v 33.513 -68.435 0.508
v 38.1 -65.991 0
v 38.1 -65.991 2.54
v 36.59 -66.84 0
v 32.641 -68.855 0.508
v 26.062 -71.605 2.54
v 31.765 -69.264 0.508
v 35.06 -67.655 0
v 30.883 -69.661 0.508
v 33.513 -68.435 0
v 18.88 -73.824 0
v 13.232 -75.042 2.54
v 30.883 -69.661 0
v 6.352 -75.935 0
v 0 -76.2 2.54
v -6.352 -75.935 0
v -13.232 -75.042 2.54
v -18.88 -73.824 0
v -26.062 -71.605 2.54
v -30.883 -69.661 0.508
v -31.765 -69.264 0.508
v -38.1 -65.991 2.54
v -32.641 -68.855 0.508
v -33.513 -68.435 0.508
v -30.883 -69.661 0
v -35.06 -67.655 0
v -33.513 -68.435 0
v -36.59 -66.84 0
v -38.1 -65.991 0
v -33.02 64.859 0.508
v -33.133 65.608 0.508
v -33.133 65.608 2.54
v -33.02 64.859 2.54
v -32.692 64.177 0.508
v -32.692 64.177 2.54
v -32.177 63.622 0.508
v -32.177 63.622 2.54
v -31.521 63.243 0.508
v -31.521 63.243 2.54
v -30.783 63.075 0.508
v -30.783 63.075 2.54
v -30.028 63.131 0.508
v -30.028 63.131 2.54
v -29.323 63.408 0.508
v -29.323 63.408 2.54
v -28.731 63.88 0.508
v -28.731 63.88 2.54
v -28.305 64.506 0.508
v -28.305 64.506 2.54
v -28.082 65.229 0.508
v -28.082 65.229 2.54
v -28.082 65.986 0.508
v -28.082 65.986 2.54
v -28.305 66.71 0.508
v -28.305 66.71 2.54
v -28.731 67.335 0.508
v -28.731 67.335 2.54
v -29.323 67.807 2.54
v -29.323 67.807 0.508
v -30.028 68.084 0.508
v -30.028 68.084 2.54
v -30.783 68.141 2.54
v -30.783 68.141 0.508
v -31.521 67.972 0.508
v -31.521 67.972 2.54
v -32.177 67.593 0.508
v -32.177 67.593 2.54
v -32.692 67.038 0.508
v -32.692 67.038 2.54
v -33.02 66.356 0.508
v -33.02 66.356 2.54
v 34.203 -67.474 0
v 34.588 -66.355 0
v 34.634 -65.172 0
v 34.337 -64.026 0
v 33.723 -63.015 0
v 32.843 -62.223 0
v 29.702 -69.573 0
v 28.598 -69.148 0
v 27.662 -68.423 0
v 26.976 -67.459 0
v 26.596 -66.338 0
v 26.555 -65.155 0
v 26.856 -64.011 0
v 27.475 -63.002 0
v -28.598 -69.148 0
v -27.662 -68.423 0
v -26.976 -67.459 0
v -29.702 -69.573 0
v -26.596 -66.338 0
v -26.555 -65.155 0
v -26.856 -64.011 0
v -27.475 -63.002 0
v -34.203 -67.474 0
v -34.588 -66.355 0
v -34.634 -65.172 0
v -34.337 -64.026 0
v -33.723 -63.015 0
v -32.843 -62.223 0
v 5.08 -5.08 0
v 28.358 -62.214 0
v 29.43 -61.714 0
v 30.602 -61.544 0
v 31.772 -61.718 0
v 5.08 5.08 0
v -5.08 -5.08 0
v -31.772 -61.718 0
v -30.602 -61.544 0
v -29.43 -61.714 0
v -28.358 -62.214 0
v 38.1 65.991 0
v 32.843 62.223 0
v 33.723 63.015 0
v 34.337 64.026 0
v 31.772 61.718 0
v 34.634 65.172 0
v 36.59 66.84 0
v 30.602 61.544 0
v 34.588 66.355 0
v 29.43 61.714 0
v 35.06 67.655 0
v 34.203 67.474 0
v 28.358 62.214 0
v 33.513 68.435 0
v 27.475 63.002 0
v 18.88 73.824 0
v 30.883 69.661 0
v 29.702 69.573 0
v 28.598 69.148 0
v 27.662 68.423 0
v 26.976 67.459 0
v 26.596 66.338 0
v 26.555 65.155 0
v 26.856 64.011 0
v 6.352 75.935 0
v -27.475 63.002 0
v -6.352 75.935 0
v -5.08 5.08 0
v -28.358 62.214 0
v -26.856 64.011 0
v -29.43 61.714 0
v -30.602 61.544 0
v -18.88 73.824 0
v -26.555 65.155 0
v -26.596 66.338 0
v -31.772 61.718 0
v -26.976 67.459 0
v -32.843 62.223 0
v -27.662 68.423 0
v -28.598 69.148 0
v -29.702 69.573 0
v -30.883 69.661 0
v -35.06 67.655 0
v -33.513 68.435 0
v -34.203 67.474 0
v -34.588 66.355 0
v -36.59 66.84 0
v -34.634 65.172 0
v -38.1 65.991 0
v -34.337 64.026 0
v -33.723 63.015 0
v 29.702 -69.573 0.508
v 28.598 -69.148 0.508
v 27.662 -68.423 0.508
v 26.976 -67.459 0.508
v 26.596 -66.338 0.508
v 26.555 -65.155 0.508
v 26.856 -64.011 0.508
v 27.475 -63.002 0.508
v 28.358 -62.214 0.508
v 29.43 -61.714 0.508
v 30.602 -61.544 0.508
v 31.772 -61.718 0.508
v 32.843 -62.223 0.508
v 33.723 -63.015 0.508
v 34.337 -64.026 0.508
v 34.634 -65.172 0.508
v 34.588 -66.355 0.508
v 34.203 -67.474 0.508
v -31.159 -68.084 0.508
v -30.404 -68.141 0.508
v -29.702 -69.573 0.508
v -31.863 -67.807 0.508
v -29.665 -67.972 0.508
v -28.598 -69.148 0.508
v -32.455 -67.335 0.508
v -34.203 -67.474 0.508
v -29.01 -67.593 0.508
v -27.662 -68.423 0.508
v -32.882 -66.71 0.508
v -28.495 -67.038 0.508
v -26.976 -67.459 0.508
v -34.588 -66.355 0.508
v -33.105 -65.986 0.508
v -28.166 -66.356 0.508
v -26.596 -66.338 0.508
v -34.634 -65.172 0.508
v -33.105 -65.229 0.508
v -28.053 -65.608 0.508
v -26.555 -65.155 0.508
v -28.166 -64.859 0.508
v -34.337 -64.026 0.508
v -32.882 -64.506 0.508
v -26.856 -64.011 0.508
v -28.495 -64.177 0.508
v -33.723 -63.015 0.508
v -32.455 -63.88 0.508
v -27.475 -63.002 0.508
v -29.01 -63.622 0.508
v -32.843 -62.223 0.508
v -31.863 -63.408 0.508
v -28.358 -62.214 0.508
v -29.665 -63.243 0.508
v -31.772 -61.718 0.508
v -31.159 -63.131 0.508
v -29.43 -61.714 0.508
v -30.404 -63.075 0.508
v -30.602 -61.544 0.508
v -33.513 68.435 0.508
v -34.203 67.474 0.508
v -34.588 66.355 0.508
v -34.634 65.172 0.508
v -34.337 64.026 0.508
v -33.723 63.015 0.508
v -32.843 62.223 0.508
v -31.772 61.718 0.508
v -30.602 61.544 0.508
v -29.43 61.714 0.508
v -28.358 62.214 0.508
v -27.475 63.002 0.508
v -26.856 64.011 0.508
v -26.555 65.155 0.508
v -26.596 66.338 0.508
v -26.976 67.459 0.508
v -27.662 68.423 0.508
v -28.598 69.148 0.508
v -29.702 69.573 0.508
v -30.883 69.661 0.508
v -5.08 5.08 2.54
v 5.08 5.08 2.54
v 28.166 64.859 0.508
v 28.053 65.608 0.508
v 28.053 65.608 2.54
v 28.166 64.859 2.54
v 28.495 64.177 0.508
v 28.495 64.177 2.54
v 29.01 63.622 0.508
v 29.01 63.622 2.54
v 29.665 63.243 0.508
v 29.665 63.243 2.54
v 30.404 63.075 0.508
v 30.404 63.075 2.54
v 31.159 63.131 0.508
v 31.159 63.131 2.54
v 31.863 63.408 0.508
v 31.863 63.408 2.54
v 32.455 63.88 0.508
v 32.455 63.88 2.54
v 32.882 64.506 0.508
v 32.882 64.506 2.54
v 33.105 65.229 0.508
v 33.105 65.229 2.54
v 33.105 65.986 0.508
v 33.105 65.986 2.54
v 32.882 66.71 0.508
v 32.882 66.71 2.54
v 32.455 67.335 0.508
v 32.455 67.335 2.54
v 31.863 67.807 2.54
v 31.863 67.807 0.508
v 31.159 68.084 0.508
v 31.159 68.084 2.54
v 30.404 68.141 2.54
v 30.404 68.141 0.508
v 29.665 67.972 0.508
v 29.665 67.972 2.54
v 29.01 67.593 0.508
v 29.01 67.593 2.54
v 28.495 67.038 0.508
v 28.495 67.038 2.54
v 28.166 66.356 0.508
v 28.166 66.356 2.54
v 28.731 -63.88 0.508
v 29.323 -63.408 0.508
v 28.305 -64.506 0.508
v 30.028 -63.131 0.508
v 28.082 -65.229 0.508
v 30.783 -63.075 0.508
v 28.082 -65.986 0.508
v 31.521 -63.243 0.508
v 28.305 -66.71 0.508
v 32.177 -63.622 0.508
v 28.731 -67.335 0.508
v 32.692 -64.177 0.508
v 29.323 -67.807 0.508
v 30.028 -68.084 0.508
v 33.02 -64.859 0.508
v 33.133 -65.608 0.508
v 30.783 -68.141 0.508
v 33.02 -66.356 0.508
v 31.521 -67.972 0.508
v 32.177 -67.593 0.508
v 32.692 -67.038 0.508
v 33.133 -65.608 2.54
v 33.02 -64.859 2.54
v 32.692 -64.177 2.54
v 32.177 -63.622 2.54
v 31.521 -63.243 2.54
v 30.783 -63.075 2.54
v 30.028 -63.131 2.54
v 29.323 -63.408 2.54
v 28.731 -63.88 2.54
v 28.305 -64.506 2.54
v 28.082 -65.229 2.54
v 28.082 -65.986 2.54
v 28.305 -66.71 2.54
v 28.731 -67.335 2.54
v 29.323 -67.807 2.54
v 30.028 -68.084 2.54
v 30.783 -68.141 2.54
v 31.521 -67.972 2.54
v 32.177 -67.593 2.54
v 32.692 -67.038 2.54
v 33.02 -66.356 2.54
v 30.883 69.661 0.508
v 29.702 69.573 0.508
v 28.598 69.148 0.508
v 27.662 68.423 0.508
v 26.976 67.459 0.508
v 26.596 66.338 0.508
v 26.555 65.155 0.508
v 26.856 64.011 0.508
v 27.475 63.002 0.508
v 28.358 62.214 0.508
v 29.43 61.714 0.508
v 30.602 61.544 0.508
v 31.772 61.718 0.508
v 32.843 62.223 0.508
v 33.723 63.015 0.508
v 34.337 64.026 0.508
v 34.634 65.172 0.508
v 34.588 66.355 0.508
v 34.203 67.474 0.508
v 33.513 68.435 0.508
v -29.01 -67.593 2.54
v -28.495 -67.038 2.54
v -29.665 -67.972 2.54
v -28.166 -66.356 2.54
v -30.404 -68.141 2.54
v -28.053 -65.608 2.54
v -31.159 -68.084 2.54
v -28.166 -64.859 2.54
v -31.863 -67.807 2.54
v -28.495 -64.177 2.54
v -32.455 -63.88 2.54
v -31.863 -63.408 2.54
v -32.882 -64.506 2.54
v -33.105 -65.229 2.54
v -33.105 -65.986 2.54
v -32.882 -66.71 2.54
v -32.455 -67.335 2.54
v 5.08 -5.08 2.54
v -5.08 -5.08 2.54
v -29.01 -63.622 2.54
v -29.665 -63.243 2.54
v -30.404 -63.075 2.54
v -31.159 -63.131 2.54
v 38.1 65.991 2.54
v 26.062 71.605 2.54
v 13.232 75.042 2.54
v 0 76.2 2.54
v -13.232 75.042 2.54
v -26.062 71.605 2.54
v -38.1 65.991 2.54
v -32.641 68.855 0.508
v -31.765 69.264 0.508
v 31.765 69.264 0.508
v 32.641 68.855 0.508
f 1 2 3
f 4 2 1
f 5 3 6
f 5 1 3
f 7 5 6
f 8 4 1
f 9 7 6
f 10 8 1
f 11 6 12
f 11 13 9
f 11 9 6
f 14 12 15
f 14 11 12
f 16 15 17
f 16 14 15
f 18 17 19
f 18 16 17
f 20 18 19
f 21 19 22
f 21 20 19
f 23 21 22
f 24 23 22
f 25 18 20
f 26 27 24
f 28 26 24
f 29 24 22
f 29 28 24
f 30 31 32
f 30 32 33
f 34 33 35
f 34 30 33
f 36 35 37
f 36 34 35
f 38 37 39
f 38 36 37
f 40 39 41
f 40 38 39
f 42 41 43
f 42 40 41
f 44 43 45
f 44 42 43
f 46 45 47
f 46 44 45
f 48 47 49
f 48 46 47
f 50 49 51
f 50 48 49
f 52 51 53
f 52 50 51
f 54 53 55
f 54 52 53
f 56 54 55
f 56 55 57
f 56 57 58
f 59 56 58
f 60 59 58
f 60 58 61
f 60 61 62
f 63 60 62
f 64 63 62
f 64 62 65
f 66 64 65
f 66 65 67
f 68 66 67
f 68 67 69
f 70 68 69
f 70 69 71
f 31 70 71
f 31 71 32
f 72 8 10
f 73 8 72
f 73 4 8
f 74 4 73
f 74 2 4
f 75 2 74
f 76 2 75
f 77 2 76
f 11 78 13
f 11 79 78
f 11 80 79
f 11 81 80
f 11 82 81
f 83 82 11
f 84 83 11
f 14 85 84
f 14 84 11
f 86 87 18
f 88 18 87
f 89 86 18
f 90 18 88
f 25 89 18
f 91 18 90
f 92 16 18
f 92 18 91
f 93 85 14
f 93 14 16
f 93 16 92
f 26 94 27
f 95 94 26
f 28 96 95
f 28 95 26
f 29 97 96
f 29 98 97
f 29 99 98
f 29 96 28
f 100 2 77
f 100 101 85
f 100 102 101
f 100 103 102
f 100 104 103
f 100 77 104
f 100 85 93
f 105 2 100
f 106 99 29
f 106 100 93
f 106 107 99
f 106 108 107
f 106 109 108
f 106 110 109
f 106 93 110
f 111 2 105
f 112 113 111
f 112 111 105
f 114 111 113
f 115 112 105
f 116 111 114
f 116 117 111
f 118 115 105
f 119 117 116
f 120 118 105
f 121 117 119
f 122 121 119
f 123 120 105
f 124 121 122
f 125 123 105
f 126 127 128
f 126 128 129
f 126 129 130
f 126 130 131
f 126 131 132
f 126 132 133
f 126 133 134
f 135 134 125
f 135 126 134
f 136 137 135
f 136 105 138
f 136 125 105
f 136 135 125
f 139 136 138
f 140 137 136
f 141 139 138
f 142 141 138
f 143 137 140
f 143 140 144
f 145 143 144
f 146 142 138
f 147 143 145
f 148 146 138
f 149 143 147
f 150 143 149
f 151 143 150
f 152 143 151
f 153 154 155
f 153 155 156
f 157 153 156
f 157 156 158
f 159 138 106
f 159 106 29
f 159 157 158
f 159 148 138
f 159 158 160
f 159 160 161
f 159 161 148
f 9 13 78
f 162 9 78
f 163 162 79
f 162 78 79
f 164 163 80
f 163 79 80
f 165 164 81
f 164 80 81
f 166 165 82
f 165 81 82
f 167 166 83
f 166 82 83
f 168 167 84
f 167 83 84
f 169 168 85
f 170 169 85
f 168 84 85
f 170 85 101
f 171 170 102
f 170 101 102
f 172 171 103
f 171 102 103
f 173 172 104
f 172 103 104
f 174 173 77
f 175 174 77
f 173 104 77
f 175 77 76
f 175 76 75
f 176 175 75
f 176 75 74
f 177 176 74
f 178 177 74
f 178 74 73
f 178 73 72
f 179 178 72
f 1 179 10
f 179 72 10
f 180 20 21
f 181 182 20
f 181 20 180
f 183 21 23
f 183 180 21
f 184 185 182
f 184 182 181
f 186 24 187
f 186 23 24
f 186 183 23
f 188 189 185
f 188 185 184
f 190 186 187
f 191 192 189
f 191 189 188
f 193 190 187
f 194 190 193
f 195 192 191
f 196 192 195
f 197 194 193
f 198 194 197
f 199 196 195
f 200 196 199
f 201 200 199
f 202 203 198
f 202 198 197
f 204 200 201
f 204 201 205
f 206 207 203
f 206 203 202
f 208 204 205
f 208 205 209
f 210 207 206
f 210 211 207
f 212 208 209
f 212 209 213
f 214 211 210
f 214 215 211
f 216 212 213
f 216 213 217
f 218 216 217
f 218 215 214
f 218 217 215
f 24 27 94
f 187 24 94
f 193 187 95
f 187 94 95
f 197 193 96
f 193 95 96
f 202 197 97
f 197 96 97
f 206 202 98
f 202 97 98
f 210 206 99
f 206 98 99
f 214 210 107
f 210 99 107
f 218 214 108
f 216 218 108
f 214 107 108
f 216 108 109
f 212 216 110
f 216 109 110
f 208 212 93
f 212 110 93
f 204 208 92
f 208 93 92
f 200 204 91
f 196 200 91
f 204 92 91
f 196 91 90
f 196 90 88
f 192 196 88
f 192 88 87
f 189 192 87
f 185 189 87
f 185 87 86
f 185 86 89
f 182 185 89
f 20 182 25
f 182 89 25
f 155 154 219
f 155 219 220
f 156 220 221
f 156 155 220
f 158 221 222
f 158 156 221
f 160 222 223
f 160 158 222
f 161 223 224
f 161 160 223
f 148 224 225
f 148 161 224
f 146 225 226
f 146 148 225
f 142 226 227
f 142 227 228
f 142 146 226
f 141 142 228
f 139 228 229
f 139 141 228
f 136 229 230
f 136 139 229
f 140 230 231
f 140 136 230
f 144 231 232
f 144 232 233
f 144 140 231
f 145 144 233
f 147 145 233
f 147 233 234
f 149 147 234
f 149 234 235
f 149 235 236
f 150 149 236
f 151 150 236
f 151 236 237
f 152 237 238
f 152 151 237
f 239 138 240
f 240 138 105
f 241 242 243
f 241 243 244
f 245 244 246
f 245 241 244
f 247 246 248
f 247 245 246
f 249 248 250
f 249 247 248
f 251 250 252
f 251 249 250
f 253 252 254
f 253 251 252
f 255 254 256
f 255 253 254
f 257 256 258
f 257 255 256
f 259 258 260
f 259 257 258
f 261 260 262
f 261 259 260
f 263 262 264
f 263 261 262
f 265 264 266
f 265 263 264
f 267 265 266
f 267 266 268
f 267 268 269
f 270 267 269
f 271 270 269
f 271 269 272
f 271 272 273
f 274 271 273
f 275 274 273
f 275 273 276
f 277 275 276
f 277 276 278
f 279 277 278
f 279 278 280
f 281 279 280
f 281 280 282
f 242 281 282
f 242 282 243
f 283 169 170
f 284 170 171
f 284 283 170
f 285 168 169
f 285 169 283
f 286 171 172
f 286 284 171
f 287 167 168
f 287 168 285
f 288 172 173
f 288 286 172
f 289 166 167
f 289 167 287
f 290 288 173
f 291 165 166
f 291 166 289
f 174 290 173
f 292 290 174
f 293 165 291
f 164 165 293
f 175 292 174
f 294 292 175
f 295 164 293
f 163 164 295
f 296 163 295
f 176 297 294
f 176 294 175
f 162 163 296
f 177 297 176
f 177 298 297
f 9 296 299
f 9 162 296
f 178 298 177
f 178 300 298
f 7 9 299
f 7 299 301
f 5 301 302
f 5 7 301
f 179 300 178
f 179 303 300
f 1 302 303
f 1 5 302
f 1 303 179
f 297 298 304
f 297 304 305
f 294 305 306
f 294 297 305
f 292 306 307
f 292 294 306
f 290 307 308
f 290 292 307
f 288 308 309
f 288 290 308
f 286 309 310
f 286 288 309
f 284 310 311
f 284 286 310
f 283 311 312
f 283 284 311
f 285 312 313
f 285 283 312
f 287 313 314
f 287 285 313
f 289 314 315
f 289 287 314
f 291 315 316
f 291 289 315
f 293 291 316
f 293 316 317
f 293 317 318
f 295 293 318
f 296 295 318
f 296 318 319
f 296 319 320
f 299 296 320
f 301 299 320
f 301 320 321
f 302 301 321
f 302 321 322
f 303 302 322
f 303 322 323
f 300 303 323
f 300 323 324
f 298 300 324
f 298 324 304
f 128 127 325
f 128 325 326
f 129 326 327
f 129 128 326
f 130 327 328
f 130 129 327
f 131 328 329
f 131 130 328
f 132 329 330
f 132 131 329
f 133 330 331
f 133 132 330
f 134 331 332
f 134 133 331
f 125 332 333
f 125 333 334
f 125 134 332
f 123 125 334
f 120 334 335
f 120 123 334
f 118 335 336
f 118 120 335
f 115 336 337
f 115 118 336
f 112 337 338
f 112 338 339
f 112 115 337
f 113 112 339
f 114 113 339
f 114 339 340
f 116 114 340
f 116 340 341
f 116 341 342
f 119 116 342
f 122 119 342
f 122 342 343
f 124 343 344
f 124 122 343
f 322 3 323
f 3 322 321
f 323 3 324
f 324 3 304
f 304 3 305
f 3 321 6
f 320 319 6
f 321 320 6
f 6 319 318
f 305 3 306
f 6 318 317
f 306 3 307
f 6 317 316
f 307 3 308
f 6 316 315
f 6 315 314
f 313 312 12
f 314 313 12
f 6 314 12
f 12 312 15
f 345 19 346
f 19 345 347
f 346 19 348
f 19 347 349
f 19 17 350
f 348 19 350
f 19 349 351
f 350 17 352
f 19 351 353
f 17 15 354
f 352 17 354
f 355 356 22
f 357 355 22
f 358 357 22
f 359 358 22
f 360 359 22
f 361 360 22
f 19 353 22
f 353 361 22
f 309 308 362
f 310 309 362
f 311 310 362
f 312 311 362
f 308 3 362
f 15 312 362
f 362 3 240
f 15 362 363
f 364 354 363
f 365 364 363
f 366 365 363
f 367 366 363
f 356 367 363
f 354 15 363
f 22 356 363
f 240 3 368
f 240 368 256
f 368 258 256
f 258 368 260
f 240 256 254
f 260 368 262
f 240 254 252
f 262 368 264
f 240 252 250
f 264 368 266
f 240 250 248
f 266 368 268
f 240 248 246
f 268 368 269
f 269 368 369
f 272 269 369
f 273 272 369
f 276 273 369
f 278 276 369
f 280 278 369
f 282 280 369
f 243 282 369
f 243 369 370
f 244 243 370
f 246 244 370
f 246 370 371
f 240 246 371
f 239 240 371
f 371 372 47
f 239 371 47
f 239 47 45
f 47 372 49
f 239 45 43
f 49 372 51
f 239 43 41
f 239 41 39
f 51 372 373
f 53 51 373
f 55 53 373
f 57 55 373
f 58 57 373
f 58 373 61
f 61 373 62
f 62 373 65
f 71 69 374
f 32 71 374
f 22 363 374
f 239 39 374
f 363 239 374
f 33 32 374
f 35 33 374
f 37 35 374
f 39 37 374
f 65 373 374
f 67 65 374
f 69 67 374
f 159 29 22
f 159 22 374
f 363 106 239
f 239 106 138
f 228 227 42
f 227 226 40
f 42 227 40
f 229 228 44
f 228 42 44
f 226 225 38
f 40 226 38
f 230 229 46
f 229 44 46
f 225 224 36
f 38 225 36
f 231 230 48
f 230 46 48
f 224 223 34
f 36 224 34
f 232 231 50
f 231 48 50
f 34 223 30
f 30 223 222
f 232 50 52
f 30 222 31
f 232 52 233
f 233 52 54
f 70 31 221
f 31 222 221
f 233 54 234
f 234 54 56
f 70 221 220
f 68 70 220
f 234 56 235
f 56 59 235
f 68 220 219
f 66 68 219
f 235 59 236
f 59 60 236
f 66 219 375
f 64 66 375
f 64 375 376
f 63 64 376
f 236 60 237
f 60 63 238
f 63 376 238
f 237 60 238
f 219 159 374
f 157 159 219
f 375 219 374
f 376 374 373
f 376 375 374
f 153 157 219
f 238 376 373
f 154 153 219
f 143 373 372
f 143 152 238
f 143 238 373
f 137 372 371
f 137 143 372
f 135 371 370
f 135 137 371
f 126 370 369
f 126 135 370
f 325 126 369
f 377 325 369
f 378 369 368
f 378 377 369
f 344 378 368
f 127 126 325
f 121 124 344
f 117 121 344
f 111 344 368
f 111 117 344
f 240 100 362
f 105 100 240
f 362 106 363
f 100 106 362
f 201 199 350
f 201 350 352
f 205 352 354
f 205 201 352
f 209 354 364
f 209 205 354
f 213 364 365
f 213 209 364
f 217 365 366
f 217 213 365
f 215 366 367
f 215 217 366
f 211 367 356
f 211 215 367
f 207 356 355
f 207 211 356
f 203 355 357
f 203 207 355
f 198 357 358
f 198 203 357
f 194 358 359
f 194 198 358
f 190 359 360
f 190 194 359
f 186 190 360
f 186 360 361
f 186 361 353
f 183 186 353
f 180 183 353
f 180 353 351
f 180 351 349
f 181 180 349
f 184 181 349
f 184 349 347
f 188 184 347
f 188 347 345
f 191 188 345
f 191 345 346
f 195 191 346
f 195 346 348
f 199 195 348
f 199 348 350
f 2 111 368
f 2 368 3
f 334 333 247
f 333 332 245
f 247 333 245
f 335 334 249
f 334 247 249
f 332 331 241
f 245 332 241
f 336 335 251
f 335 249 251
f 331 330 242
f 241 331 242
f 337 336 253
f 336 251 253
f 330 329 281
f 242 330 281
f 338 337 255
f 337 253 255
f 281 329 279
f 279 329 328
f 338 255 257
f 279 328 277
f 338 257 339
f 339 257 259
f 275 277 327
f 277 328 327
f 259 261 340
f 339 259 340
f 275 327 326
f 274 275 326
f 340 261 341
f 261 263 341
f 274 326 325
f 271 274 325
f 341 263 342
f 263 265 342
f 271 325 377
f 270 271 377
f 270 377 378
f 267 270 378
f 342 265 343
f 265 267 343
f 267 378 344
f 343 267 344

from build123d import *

# Parameters (mm, degrees)
SKETCH2_R            = 2.54
SKETCH2_W            = 10.16
SKETCH2_H            = 10.16
BOSS_EXTRUDE1_DEPTH  = 2.54
CUT_EXTRUDE1_DEPTH   = 0.508
CIRPATTERN1_COUNT    = 2
CIRPATTERN1_ANGLE    = 50
MIRROR2_COPY_1_DEPTH = 0.508


with BuildPart() as part:
    # Sketch2 → Boss-Extrude1 (new body)
    with BuildSketch(Plane.XY):
        with BuildLine():
            Line((-38.1, -65.991135768), (-38.1, 65.991135768))
            ThreePointArc((-38.1, 65.991135768), (0, 76.2), (38.1, 65.991135768))
            Line((38.1, 65.991135768), (38.1, -65.991135768))
            ThreePointArc((38.1, -65.991135768), (0, -76.2), (-38.1, -65.991135768))
        make_face()
        with Locations((30.593335967, 65.607620704)):
            Circle(SKETCH2_R, mode=Mode.SUBTRACT)
        with Locations((-30.593335967, -65.607620704)):
            Circle(SKETCH2_R, mode=Mode.SUBTRACT)
        with Locations((-30.593335967, 65.607620704)):
            Circle(SKETCH2_R, mode=Mode.SUBTRACT)
        with Locations((30.593335967, -65.607620704)):
            Circle(SKETCH2_R, mode=Mode.SUBTRACT)
        Rectangle(SKETCH2_W, SKETCH2_H, mode=Mode.SUBTRACT)
    extrude(amount=BOSS_EXTRUDE1_DEPTH)

    # Sketch6 → Cut-Extrude1 (cut)
    with BuildSketch(Plane.XY):
        with BuildLine():
            ThreePointArc((30.882724846, 69.661304223), (28.875815352, 61.924385857), (33.512622116, 68.434962986))
            ThreePointArc((33.512622116, 68.434962986), (32.203511545, 69.060653372), (30.882724846, 69.661304223))
        make_face()
    cut_extrude1 = extrude(amount=CUT_EXTRUDE1_DEPTH, mode=Mode.SUBTRACT)

    # CirPattern1: Cut-Extrude1 ×2 about axis
    cirpattern1_axis = Axis((0, 0, 2.54), (0, 0, 1))
    for i in range(1, CIRPATTERN1_COUNT):
        add(cut_extrude1.rotate(cirpattern1_axis, i * CIRPATTERN1_ANGLE / (CIRPATTERN1_COUNT - 1)), mode=Mode.SUBTRACT)

    # Mirror2: Cut-Extrude1 across plane
    add(cut_extrude1.mirror(Plane(origin=(0, 0, 0), x_dir=(0, 0, 1), z_dir=(0, -1, 0))), mode=Mode.SUBTRACT)

    # Mirror2 copy 1 sketch → Mirror2 copy 1 (cut)
    with BuildSketch(Plane(origin=(0, 0, 0), x_dir=(0.6427876096865379, -0.7660444431189793, 0), z_dir=(0, 0, 1))):
        with BuildLine():
            ThreePointArc((30.882724846, -69.661304223), (28.875815352, -61.924385857), (33.512622116, -68.434962986))
            ThreePointArc((33.512622116, -68.434962986), (32.203511545, -69.060653372), (30.882724846, -69.661304223))
        make_face()
    extrude(amount=MIRROR2_COPY_1_DEPTH, mode=Mode.SUBTRACT)


solid = part.part
